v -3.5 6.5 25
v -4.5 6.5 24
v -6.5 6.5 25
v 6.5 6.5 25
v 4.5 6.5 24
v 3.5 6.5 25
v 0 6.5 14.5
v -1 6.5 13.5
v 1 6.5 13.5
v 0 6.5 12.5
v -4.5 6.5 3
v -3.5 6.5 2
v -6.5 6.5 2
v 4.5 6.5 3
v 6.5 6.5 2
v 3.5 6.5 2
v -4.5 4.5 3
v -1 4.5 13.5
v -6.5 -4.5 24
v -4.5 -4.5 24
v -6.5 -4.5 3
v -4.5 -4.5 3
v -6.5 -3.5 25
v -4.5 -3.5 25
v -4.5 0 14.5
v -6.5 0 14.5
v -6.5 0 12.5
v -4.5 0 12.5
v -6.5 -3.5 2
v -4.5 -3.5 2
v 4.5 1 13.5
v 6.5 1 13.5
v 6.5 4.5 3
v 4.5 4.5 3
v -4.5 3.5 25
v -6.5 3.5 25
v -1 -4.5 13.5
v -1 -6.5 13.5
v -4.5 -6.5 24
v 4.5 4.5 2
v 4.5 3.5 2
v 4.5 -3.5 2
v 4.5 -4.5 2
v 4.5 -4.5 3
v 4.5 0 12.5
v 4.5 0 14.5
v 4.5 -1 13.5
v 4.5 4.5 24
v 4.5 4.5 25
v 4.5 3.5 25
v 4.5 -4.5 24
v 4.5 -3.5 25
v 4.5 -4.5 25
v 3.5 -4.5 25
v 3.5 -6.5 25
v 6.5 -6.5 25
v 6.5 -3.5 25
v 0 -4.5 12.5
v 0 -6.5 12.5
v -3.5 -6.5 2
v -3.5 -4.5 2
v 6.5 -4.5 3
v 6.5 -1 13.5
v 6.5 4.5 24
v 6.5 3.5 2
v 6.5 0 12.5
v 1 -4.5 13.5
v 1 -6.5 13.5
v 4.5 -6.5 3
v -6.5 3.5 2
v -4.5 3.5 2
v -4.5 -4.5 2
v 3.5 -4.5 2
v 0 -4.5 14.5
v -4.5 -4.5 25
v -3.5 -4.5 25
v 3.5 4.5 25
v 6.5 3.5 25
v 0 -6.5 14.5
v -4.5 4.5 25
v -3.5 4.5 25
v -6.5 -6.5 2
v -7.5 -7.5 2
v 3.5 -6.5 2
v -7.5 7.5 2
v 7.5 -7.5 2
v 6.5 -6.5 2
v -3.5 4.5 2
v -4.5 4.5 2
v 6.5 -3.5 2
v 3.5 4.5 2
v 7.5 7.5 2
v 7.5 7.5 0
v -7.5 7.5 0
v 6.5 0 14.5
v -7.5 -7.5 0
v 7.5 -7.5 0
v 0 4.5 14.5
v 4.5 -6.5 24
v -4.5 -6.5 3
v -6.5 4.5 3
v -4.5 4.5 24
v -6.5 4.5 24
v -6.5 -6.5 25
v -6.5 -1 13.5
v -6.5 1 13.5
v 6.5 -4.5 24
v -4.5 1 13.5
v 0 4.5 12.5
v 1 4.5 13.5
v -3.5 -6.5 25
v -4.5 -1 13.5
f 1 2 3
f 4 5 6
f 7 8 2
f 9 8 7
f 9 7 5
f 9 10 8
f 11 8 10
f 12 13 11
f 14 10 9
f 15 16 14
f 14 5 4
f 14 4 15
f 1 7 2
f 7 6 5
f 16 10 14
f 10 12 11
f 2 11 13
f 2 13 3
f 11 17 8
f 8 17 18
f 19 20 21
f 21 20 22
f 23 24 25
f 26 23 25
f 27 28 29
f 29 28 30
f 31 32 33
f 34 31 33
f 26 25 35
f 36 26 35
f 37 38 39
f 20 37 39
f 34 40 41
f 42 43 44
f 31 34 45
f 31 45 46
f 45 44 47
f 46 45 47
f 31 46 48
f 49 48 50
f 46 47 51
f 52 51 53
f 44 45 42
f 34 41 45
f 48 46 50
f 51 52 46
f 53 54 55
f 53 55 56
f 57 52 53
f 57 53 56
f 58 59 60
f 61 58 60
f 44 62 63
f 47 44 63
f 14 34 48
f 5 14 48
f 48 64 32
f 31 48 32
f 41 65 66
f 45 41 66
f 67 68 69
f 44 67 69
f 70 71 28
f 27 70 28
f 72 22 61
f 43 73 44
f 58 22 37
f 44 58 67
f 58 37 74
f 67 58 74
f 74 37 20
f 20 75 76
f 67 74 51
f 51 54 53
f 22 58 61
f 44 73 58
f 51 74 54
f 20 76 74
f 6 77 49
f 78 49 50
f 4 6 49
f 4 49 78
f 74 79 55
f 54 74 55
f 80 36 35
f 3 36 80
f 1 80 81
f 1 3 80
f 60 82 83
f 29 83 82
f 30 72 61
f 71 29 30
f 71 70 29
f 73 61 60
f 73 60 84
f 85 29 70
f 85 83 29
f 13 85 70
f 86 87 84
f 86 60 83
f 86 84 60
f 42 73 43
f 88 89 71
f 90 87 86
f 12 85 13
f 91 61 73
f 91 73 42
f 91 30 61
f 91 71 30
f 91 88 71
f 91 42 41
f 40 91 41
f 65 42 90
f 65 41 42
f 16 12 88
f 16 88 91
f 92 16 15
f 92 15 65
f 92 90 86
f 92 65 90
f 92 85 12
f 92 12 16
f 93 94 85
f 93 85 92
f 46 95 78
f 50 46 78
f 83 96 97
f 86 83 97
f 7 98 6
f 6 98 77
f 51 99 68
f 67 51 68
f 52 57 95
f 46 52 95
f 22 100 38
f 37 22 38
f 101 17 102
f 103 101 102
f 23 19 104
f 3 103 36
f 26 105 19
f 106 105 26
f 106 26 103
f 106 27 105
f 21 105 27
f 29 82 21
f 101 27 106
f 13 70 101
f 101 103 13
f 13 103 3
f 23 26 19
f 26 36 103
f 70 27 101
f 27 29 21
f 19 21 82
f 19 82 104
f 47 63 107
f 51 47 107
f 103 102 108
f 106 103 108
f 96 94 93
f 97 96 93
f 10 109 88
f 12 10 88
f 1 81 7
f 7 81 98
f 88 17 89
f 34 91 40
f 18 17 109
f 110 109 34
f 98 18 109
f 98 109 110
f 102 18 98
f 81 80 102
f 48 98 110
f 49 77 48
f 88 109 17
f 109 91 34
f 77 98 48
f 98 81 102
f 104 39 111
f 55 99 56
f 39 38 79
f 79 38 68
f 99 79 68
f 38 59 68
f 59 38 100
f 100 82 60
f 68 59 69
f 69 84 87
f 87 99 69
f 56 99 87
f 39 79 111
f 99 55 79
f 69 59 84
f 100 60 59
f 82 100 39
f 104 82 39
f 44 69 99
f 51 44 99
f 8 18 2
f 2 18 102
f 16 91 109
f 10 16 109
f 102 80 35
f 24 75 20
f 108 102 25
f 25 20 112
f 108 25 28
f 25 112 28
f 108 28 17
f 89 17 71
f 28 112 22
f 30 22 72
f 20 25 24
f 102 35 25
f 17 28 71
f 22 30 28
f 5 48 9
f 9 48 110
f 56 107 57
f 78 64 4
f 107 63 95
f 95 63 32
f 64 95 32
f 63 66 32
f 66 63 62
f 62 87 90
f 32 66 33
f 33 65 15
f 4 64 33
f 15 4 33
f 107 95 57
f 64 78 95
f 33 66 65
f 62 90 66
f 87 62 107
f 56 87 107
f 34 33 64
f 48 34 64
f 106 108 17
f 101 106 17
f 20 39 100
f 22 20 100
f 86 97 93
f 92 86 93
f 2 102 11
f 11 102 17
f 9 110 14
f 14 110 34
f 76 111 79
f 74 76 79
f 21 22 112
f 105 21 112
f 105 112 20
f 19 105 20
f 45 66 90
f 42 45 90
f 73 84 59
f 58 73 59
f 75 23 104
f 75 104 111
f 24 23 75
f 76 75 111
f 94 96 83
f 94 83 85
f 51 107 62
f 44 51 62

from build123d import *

# Parameters (mm, degrees)
F0_W      = 15
F0_H      = 15
F1_DEPTH  = 25
F2_W      = 9
F2_H      = 9
F3_DEPTH  = 23
F6_DEPTH  = 15.001
F8_DEPTH  = 15.001
F9_W      = 15
F9_H      = 15
F9_W_2    = 13
F9_H_2    = 13
F10_DEPTH = 40.4


with BuildPart() as f1:
    # F0 (on Top) → F1 (new body)
    with BuildSketch(Plane.XY):
        Rectangle(F0_W, F0_H)
    extrude(amount=F1_DEPTH)

    # F2 (on face) → F3 (cut)
    with BuildSketch(Plane.XY.offset(25)):
        Rectangle(F2_W, F2_H)
    extrude(amount=-F3_DEPTH, mode=Mode.SUBTRACT)

    # F5 (on face) → F6 (cut, through all)
    with BuildSketch(Plane.XZ.offset(7.5)):
        Polygon((3.5, 25), (-3.5, 25), (0, 14.5), align=None)
        Polygon((0, 12.5), (-3.5, 2), (3.5, 2), align=None)
        Polygon((-1, 13.5), (-4.5, 24), (-4.5, 3), align=None)
        Polygon((4.5, 3), (4.5, 24), (1, 13.5), align=None)
    extrude(amount=-F6_DEPTH, mode=Mode.SUBTRACT)

    # F7 (on face) → F8 (cut, through all)
    with BuildSketch(Plane.YZ.offset(7.5)):
        Polygon((3.5, 25), (-3.5, 25), (0, 14.5), align=None)
        Polygon((0, 12.5), (-3.5, 2), (3.5, 2), align=None)
        Polygon((4.5, 3), (4.5, 24), (1, 13.5), align=None)
        Polygon((-1, 13.5), (-4.5, 24), (-4.5, 3), align=None)
    extrude(amount=-F8_DEPTH, mode=Mode.SUBTRACT)

    # F9 (on face) → F10 (cut)
    with BuildSketch(Plane.XY.offset(2)):
        Rectangle(F9_W, F9_H)
        Rectangle(F9_W_2, F9_H_2, mode=Mode.SUBTRACT)
    extrude(amount=F10_DEPTH, mode=Mode.SUBTRACT)


solid = f1.part
